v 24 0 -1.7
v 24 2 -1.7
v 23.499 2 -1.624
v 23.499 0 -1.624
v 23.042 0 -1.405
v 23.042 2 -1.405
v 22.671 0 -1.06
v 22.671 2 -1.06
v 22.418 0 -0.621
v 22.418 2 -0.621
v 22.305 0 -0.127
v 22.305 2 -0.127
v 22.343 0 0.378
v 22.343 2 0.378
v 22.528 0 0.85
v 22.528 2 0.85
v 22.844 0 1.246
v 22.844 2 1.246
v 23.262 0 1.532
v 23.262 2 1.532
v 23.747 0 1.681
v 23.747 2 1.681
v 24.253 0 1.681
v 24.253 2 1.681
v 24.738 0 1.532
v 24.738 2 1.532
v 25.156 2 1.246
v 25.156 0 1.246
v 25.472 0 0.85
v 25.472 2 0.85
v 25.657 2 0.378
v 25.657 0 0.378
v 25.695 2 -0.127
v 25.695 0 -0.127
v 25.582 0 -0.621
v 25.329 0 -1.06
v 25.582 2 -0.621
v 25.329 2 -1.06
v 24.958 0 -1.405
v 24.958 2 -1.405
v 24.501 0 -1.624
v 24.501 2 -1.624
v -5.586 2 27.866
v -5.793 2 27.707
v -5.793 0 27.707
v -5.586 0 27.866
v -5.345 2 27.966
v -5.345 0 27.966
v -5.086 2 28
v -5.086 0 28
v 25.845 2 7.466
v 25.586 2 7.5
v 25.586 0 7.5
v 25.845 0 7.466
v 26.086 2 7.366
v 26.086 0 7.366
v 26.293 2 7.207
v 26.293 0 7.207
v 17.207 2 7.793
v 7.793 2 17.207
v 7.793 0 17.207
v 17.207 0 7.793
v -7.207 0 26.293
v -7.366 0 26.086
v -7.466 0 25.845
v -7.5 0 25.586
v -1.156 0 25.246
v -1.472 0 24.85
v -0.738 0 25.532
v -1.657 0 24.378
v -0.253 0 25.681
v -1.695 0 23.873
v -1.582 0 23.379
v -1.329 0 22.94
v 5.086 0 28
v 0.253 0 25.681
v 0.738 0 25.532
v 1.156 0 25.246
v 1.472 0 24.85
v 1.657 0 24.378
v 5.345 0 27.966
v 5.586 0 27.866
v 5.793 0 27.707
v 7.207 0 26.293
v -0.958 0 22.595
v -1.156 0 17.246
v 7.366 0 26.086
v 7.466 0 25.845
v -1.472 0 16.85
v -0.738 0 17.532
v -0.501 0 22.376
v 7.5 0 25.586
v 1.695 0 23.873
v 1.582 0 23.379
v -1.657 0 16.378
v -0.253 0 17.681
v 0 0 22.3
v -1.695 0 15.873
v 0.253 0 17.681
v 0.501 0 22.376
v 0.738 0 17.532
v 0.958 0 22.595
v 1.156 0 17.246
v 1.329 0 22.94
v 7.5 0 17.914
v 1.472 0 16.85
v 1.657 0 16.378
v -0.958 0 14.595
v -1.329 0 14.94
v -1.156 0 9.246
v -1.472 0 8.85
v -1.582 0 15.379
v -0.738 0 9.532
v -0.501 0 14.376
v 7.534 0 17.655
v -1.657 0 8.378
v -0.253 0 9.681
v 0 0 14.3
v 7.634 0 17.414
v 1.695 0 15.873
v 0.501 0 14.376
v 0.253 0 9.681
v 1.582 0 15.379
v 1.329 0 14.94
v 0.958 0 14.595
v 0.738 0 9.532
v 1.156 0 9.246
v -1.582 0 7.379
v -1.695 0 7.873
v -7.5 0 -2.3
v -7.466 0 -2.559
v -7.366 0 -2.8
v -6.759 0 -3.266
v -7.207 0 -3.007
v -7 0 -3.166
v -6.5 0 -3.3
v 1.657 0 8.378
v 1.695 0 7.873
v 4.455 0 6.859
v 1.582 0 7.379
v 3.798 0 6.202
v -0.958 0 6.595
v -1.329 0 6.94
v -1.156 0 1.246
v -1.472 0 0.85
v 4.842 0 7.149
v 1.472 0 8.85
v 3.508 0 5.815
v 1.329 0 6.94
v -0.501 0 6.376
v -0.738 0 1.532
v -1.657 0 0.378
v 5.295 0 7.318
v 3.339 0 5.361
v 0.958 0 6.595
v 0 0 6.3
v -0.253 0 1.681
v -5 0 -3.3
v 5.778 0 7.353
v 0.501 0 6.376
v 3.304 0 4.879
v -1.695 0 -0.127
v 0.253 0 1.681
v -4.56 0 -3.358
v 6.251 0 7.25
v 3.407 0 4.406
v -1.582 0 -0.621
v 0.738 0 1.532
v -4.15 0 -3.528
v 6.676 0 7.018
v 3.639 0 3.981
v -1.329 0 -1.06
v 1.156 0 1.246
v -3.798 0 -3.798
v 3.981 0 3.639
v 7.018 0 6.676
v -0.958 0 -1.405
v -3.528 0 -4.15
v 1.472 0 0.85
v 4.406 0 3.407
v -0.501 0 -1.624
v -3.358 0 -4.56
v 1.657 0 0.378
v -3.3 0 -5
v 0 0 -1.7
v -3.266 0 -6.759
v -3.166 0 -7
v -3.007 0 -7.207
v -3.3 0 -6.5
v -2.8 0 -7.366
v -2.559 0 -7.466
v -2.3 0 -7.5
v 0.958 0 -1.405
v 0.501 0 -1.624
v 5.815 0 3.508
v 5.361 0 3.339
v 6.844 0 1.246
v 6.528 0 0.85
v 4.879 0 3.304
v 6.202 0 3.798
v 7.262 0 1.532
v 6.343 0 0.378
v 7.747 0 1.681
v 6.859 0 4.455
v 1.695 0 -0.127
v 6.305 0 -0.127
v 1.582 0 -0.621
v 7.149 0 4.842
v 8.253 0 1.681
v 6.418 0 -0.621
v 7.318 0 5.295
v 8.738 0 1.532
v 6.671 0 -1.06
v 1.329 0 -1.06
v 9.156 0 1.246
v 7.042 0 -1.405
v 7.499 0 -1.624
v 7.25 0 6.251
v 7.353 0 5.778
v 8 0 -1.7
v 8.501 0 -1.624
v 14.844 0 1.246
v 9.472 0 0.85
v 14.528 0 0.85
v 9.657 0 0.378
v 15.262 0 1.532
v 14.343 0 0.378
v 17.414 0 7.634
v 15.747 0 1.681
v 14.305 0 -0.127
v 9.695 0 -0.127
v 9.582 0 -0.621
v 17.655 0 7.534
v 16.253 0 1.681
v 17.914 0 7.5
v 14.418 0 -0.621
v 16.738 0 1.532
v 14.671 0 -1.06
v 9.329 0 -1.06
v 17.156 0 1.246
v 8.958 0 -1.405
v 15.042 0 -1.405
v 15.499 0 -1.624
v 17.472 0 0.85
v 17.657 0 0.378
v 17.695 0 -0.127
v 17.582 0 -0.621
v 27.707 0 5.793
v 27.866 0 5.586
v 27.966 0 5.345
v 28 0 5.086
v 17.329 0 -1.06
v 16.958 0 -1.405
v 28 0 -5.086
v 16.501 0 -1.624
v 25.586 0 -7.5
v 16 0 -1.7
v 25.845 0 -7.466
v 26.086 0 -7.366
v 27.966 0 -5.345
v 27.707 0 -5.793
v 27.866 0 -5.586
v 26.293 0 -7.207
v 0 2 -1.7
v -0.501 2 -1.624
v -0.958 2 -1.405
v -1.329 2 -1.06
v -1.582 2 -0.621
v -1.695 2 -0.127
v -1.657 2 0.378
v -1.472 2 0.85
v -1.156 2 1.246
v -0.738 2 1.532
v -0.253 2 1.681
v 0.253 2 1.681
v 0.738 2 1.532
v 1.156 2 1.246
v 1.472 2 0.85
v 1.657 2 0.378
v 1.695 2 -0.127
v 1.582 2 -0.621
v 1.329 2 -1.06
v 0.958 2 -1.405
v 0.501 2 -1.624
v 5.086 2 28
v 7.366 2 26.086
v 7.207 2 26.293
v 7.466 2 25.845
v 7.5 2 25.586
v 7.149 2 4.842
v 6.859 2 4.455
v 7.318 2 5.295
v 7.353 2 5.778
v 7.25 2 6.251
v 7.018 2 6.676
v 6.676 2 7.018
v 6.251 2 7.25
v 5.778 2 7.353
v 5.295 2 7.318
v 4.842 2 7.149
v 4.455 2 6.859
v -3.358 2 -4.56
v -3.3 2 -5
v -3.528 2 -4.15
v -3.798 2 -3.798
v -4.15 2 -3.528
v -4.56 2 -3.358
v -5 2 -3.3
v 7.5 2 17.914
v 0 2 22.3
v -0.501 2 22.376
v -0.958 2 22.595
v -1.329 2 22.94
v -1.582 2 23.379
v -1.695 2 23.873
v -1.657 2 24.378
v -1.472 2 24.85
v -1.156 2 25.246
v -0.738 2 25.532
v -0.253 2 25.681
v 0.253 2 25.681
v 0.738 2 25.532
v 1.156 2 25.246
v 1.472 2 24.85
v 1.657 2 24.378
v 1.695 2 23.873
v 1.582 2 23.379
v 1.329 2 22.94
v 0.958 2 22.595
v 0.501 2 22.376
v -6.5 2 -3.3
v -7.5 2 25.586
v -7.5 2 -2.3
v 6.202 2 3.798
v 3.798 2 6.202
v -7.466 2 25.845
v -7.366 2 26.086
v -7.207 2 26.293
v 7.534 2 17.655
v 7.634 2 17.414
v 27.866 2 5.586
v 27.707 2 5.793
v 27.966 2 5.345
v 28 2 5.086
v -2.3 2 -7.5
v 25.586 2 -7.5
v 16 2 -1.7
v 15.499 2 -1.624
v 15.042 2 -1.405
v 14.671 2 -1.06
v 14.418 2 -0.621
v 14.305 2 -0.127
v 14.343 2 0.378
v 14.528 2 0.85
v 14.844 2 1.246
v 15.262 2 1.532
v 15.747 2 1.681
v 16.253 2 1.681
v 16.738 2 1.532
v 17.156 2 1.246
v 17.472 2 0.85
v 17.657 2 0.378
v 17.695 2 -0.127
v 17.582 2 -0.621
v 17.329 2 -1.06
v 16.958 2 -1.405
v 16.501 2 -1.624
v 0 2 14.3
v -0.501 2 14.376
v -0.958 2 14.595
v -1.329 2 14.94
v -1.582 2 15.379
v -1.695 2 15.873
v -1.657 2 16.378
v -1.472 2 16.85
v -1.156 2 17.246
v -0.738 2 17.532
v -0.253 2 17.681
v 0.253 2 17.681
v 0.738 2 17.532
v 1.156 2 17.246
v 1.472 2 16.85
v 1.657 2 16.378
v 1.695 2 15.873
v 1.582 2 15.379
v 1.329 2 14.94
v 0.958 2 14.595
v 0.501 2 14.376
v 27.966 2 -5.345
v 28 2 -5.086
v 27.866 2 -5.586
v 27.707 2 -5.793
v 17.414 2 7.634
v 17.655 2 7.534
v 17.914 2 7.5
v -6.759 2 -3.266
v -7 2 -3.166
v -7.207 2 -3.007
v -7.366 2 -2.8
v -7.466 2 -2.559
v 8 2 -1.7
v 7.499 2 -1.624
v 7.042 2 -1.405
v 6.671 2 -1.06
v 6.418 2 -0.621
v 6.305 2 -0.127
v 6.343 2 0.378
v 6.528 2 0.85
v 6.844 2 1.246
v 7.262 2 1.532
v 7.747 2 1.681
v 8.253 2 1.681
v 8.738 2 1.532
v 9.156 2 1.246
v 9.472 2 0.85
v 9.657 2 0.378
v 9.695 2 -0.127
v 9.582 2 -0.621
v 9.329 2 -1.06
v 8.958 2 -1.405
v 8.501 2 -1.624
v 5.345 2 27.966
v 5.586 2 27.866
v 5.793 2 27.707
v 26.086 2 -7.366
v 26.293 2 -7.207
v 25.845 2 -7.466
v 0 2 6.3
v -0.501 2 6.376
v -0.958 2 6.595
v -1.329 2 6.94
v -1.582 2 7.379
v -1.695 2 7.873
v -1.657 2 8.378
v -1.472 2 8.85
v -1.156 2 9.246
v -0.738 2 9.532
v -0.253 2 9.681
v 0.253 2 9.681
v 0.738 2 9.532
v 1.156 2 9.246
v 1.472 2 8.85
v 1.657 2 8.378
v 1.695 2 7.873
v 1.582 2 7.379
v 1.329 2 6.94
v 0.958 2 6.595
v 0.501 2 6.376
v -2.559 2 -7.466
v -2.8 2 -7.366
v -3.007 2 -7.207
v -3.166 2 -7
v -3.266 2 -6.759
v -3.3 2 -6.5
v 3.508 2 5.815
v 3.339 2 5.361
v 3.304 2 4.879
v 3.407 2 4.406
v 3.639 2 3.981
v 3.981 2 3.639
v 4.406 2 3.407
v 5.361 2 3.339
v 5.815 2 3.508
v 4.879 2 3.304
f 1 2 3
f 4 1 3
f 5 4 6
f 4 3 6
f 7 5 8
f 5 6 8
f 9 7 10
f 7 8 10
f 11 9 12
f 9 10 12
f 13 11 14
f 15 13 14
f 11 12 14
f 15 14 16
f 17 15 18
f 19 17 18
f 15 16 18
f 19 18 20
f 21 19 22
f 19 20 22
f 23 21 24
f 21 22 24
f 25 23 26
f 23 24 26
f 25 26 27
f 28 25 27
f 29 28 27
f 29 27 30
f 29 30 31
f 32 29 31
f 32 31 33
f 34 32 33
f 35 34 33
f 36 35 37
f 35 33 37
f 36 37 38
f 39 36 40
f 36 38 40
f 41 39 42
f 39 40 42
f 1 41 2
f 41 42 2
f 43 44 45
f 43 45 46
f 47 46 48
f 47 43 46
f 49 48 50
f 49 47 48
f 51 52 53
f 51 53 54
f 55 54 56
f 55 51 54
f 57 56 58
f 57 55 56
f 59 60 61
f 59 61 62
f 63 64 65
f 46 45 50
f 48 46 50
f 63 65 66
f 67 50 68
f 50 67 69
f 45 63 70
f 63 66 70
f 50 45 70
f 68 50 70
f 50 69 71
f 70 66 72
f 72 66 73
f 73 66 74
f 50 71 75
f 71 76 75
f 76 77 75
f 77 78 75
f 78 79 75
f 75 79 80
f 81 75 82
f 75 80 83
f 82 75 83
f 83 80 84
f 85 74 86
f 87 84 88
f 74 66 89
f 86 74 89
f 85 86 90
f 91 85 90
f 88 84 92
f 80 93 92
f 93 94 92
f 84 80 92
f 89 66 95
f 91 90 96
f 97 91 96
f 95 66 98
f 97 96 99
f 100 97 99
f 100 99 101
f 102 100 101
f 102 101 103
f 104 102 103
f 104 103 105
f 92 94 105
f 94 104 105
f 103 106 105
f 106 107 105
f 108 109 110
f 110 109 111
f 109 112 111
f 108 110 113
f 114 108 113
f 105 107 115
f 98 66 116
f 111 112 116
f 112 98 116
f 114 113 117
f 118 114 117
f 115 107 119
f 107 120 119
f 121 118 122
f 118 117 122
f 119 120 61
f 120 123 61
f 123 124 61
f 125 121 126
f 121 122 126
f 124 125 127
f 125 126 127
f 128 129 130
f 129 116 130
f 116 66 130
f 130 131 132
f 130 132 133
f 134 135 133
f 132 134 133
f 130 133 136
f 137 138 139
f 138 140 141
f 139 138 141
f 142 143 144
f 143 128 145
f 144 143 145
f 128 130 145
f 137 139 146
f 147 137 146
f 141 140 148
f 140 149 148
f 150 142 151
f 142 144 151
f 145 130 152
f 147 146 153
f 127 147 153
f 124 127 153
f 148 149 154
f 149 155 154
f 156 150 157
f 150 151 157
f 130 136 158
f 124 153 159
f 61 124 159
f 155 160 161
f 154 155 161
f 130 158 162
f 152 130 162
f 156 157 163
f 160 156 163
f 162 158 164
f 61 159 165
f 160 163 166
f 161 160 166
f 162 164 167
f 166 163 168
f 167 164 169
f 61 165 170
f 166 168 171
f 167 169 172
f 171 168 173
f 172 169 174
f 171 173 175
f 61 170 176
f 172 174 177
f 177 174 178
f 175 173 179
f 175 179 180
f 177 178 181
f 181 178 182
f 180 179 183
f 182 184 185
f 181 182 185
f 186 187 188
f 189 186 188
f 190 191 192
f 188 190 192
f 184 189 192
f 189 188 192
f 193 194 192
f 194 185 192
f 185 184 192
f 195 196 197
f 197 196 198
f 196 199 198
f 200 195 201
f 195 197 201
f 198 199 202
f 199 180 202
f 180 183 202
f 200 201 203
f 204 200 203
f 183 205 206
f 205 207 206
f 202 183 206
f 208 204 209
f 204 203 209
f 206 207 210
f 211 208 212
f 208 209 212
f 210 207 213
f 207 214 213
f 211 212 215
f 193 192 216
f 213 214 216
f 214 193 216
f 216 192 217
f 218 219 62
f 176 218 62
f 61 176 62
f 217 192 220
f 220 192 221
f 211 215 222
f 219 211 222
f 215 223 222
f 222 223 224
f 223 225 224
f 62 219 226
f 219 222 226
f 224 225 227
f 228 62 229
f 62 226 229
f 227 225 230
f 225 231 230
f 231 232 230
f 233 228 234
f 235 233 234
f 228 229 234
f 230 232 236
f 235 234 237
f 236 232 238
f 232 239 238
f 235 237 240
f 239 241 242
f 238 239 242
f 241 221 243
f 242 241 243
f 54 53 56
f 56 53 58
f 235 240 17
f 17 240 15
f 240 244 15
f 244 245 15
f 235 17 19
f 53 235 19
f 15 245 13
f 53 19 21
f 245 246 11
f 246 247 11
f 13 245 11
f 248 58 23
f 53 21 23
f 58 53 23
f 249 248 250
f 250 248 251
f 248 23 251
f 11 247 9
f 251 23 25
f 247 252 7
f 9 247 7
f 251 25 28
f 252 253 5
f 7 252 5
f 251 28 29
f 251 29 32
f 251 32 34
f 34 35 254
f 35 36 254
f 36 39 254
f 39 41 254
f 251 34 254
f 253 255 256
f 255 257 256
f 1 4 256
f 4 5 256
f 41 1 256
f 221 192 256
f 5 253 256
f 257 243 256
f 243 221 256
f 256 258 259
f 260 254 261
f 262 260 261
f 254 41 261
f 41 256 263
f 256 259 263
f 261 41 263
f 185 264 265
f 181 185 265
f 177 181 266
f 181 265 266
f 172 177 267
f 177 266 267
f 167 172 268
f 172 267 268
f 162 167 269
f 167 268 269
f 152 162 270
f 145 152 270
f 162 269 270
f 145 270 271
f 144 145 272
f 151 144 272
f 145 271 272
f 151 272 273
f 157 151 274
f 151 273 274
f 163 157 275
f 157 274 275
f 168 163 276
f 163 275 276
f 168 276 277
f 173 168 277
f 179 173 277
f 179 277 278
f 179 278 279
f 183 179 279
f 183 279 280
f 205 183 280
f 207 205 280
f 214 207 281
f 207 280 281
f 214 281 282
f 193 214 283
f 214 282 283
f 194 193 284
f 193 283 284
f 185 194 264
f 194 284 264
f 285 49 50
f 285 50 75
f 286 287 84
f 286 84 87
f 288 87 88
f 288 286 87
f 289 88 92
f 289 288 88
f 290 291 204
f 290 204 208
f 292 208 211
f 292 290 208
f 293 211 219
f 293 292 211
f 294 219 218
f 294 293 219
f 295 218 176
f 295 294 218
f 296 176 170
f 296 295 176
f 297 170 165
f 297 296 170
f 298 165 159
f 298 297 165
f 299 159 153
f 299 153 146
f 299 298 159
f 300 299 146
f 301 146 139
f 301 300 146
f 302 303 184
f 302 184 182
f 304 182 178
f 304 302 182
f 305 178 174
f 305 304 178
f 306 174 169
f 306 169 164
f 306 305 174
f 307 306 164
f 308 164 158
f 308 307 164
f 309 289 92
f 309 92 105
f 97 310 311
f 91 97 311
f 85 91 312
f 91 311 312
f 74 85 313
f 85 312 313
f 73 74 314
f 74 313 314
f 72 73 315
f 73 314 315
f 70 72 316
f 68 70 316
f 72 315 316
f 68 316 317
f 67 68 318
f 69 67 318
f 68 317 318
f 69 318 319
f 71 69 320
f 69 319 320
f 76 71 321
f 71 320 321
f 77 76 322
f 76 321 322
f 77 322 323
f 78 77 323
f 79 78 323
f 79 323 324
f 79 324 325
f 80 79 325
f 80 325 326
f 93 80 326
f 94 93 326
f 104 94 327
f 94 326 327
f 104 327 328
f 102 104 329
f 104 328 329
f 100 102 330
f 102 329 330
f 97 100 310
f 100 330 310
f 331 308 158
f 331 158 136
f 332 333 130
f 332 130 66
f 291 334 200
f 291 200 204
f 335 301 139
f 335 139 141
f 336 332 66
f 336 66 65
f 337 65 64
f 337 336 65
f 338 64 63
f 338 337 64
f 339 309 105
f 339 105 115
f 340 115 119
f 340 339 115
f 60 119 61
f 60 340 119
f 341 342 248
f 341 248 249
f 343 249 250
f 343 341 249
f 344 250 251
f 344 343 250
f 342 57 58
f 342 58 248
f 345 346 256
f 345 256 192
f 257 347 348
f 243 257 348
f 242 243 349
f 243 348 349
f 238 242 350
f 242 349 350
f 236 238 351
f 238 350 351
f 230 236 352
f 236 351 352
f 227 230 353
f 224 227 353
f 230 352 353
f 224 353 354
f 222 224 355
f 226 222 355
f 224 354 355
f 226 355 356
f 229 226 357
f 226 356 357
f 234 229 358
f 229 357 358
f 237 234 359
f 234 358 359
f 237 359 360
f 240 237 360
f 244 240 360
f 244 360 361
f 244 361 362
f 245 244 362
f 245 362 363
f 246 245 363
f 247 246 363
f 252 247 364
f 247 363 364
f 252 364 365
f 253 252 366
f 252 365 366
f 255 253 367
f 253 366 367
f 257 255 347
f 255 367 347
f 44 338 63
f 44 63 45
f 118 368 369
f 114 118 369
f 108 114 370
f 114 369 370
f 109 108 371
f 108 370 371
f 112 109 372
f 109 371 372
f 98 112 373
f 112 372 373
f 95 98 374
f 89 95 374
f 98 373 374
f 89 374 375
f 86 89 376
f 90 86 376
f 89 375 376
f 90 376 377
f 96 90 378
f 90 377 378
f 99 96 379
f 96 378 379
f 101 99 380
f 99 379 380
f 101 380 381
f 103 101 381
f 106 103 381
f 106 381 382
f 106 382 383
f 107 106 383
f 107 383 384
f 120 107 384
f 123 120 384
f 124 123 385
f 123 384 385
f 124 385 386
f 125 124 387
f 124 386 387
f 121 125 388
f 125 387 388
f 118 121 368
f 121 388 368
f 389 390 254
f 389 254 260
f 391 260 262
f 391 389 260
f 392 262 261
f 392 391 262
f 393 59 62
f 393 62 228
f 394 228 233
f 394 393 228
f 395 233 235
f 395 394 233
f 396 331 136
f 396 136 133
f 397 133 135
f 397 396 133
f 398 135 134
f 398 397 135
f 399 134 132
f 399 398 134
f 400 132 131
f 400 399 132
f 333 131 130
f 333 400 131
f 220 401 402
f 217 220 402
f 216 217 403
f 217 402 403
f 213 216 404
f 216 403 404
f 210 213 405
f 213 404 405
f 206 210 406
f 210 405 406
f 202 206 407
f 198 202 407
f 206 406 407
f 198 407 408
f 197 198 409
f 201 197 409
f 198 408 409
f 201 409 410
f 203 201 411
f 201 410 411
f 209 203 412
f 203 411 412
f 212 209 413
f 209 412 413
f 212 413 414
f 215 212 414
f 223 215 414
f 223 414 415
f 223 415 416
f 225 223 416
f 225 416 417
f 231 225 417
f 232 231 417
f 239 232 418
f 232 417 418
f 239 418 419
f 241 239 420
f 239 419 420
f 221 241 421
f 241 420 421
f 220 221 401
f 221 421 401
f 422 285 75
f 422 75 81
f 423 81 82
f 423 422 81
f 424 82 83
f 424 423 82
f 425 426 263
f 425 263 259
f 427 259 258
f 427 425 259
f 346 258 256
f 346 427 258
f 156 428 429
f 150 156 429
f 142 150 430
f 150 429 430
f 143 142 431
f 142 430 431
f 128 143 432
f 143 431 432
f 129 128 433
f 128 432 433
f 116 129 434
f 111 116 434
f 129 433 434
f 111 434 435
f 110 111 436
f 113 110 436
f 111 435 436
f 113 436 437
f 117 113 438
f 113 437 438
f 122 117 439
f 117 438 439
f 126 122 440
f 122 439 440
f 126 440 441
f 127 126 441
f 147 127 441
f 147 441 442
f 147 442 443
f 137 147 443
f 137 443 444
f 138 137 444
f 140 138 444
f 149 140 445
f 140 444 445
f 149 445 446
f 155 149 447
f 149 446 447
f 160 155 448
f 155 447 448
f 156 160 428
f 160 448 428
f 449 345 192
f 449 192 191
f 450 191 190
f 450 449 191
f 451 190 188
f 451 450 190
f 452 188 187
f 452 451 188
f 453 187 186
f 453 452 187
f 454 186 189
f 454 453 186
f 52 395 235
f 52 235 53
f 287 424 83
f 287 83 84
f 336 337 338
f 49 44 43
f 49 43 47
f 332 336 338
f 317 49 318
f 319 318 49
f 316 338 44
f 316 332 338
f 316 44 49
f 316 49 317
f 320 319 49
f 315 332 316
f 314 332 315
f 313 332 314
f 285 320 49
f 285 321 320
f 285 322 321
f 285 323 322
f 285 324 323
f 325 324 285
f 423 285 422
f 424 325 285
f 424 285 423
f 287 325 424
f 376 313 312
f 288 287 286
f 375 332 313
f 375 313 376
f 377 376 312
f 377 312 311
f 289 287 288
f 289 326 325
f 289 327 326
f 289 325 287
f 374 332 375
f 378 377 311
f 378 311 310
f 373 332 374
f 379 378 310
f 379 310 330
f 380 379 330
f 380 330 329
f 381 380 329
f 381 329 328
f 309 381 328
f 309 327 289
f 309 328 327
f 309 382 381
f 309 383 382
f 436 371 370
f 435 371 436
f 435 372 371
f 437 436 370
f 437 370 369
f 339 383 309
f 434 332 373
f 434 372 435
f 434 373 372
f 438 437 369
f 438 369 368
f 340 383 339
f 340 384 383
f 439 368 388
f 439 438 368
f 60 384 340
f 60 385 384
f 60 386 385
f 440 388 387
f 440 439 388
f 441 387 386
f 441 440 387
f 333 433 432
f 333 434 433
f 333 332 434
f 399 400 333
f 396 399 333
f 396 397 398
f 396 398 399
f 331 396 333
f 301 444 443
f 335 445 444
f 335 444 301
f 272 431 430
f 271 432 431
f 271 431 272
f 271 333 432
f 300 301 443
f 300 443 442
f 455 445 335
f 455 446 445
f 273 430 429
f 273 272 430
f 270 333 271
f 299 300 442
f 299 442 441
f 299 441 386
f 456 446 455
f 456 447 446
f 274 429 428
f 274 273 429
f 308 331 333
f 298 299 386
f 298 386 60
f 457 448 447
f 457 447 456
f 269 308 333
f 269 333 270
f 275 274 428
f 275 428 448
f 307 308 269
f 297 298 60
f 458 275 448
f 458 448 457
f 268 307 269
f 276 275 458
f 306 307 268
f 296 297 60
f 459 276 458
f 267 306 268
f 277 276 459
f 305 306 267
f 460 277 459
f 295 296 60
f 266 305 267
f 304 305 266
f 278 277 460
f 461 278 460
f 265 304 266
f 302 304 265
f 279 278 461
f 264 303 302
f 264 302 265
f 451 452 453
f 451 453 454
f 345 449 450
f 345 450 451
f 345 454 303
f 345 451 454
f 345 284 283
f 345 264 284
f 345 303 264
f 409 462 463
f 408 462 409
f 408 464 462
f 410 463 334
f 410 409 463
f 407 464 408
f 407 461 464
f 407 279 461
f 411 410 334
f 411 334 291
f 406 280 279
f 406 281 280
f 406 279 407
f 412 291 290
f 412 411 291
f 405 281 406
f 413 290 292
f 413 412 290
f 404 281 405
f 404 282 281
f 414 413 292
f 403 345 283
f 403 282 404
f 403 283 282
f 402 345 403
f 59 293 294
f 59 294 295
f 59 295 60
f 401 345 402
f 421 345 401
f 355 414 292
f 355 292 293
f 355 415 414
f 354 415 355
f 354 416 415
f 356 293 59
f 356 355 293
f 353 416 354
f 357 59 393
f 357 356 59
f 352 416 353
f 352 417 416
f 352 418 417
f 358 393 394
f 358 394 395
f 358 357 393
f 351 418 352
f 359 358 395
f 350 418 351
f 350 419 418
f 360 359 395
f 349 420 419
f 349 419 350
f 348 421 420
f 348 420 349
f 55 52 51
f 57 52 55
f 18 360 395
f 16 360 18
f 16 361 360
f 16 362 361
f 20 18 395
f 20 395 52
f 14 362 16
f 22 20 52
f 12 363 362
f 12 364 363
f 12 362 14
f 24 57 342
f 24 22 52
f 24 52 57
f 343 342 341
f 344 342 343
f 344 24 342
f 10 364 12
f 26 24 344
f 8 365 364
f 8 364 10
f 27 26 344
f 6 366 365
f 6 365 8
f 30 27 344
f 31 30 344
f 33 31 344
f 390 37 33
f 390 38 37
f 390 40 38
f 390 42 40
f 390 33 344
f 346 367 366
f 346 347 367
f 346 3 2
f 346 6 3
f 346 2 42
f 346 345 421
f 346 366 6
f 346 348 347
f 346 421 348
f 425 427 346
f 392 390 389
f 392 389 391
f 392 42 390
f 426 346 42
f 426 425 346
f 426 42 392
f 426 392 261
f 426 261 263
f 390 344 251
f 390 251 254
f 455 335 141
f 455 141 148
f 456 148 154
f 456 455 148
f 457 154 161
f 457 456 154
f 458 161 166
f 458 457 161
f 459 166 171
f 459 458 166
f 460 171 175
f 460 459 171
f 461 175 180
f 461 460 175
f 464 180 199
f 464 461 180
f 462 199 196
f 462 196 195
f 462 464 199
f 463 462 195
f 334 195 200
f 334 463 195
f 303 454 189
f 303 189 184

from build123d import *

# Parameters (mm, degrees)
SKETCH1_R           = 1.7
BOSS_EXTRUDE1_DEPTH = 2


with BuildPart() as part:
    # Sketch1 → Boss-Extrude1 (new body)
    with BuildSketch(Plane(origin=(0, 2, 0), x_dir=(1, 0, 0), z_dir=(0, 1, 0))):
        with BuildLine():
            Line((26.292893219, -7.207106781), (27.707106781, -5.792893219))
            ThreePointArc((27.707106781, -5.792893219), (27.923879533, -5.46846987), (28, -5.085786438))
            Line((28, -5.085786438), (28, 5.085786438))
            ThreePointArc((28, 5.085786438), (27.923879533, 5.46846987), (27.707106781, 5.792893219))
            Line((27.707106781, 5.792893219), (26.292893219, 7.207106781))
            ThreePointArc((26.292893219, 7.207106781), (25.96846987, 7.423879533), (25.585786438, 7.5))
            Line((25.585786438, 7.5), (-2.3, 7.5))
            ThreePointArc((-2.3, 7.5), (-3.007106781, 7.207106781), (-3.3, 6.5))
            Line((-3.3, 6.5), (-3.3, 5))
            ThreePointArc((-3.3, 5), (-3.797918472, 3.797918472), (-5, 3.3))
            Line((-5, 3.3), (-6.5, 3.3))
            ThreePointArc((-6.5, 3.3), (-7.207106781, 3.007106781), (-7.5, 2.3))
            Line((-7.5, 2.3), (-7.5, -25.585786438))
            ThreePointArc((-7.5, -25.585786438), (-7.423879533, -25.96846987), (-7.207106781, -26.292893219))
            Line((-7.207106781, -26.292893219), (-5.792893219, -27.707106781))
            ThreePointArc((-5.792893219, -27.707106781), (-5.46846987, -27.923879533), (-5.085786438, -28))
            Line((-5.085786438, -28), (5.085786438, -28))
            ThreePointArc((5.085786438, -28), (5.46846987, -27.923879533), (5.792893219, -27.707106781))
            Line((5.792893219, -27.707106781), (7.207106781, -26.292893219))
            ThreePointArc((7.207106781, -26.292893219), (7.423879533, -25.96846987), (7.5, -25.585786438))
            Line((7.5, -25.585786438), (7.5, -17.914213562))
            ThreePointArc((7.5, -17.914213562), (7.576120467, -17.53153013), (7.792893219, -17.207106781))
            Line((7.792893219, -17.207106781), (17.207106781, -7.792893219))
            ThreePointArc((17.207106781, -7.792893219), (17.53153013, -7.576120467), (17.914213562, -7.5))
            Line((17.914213562, -7.5), (25.585786438, -7.5))
            ThreePointArc((25.585786438, -7.5), (25.96846987, -7.423879533), (26.292893219, -7.207106781))
        make_face()
        with Locations(Location((0, -16, 0), (0, 0, 90))):
            Circle(SKETCH1_R, mode=Mode.SUBTRACT)
        with Locations(Location((0, -24, 0), (0, 0, 90))):
            Circle(SKETCH1_R, mode=Mode.SUBTRACT)
        with Locations(Location((24, 0, 0), (0, 0, 90))):
            Circle(SKETCH1_R, mode=Mode.SUBTRACT)
        with Locations(Location((16, 0, 0), (0, 0, 90))):
            Circle(SKETCH1_R, mode=Mode.SUBTRACT)
        with Locations(Location((0, 0, 0), (0, 0, 90))):
            Circle(SKETCH1_R, mode=Mode.SUBTRACT)
        with Locations(Location((8, 0, 0), (0, 0, 90))):
            Circle(SKETCH1_R, mode=Mode.SUBTRACT)
        with Locations(Location((0, -8, 0), (0, 0, 90))):
            Circle(SKETCH1_R, mode=Mode.SUBTRACT)
        with BuildLine():
            Line((4.454772721, -6.858935778), (3.797918472, -6.202081528))
            ThreePointArc((3.797918472, -6.202081528), (3.797918472, -3.797918472), (6.202081528, -3.797918472))
            Line((6.202081528, -3.797918472), (6.858935778, -4.454772721))
            ThreePointArc((6.858935778, -4.454772721), (6.858935778, -6.858935778), (4.454772721, -6.858935778))
        make_face(mode=Mode.SUBTRACT)
    extrude(amount=-BOSS_EXTRUDE1_DEPTH)


solid = part.part
